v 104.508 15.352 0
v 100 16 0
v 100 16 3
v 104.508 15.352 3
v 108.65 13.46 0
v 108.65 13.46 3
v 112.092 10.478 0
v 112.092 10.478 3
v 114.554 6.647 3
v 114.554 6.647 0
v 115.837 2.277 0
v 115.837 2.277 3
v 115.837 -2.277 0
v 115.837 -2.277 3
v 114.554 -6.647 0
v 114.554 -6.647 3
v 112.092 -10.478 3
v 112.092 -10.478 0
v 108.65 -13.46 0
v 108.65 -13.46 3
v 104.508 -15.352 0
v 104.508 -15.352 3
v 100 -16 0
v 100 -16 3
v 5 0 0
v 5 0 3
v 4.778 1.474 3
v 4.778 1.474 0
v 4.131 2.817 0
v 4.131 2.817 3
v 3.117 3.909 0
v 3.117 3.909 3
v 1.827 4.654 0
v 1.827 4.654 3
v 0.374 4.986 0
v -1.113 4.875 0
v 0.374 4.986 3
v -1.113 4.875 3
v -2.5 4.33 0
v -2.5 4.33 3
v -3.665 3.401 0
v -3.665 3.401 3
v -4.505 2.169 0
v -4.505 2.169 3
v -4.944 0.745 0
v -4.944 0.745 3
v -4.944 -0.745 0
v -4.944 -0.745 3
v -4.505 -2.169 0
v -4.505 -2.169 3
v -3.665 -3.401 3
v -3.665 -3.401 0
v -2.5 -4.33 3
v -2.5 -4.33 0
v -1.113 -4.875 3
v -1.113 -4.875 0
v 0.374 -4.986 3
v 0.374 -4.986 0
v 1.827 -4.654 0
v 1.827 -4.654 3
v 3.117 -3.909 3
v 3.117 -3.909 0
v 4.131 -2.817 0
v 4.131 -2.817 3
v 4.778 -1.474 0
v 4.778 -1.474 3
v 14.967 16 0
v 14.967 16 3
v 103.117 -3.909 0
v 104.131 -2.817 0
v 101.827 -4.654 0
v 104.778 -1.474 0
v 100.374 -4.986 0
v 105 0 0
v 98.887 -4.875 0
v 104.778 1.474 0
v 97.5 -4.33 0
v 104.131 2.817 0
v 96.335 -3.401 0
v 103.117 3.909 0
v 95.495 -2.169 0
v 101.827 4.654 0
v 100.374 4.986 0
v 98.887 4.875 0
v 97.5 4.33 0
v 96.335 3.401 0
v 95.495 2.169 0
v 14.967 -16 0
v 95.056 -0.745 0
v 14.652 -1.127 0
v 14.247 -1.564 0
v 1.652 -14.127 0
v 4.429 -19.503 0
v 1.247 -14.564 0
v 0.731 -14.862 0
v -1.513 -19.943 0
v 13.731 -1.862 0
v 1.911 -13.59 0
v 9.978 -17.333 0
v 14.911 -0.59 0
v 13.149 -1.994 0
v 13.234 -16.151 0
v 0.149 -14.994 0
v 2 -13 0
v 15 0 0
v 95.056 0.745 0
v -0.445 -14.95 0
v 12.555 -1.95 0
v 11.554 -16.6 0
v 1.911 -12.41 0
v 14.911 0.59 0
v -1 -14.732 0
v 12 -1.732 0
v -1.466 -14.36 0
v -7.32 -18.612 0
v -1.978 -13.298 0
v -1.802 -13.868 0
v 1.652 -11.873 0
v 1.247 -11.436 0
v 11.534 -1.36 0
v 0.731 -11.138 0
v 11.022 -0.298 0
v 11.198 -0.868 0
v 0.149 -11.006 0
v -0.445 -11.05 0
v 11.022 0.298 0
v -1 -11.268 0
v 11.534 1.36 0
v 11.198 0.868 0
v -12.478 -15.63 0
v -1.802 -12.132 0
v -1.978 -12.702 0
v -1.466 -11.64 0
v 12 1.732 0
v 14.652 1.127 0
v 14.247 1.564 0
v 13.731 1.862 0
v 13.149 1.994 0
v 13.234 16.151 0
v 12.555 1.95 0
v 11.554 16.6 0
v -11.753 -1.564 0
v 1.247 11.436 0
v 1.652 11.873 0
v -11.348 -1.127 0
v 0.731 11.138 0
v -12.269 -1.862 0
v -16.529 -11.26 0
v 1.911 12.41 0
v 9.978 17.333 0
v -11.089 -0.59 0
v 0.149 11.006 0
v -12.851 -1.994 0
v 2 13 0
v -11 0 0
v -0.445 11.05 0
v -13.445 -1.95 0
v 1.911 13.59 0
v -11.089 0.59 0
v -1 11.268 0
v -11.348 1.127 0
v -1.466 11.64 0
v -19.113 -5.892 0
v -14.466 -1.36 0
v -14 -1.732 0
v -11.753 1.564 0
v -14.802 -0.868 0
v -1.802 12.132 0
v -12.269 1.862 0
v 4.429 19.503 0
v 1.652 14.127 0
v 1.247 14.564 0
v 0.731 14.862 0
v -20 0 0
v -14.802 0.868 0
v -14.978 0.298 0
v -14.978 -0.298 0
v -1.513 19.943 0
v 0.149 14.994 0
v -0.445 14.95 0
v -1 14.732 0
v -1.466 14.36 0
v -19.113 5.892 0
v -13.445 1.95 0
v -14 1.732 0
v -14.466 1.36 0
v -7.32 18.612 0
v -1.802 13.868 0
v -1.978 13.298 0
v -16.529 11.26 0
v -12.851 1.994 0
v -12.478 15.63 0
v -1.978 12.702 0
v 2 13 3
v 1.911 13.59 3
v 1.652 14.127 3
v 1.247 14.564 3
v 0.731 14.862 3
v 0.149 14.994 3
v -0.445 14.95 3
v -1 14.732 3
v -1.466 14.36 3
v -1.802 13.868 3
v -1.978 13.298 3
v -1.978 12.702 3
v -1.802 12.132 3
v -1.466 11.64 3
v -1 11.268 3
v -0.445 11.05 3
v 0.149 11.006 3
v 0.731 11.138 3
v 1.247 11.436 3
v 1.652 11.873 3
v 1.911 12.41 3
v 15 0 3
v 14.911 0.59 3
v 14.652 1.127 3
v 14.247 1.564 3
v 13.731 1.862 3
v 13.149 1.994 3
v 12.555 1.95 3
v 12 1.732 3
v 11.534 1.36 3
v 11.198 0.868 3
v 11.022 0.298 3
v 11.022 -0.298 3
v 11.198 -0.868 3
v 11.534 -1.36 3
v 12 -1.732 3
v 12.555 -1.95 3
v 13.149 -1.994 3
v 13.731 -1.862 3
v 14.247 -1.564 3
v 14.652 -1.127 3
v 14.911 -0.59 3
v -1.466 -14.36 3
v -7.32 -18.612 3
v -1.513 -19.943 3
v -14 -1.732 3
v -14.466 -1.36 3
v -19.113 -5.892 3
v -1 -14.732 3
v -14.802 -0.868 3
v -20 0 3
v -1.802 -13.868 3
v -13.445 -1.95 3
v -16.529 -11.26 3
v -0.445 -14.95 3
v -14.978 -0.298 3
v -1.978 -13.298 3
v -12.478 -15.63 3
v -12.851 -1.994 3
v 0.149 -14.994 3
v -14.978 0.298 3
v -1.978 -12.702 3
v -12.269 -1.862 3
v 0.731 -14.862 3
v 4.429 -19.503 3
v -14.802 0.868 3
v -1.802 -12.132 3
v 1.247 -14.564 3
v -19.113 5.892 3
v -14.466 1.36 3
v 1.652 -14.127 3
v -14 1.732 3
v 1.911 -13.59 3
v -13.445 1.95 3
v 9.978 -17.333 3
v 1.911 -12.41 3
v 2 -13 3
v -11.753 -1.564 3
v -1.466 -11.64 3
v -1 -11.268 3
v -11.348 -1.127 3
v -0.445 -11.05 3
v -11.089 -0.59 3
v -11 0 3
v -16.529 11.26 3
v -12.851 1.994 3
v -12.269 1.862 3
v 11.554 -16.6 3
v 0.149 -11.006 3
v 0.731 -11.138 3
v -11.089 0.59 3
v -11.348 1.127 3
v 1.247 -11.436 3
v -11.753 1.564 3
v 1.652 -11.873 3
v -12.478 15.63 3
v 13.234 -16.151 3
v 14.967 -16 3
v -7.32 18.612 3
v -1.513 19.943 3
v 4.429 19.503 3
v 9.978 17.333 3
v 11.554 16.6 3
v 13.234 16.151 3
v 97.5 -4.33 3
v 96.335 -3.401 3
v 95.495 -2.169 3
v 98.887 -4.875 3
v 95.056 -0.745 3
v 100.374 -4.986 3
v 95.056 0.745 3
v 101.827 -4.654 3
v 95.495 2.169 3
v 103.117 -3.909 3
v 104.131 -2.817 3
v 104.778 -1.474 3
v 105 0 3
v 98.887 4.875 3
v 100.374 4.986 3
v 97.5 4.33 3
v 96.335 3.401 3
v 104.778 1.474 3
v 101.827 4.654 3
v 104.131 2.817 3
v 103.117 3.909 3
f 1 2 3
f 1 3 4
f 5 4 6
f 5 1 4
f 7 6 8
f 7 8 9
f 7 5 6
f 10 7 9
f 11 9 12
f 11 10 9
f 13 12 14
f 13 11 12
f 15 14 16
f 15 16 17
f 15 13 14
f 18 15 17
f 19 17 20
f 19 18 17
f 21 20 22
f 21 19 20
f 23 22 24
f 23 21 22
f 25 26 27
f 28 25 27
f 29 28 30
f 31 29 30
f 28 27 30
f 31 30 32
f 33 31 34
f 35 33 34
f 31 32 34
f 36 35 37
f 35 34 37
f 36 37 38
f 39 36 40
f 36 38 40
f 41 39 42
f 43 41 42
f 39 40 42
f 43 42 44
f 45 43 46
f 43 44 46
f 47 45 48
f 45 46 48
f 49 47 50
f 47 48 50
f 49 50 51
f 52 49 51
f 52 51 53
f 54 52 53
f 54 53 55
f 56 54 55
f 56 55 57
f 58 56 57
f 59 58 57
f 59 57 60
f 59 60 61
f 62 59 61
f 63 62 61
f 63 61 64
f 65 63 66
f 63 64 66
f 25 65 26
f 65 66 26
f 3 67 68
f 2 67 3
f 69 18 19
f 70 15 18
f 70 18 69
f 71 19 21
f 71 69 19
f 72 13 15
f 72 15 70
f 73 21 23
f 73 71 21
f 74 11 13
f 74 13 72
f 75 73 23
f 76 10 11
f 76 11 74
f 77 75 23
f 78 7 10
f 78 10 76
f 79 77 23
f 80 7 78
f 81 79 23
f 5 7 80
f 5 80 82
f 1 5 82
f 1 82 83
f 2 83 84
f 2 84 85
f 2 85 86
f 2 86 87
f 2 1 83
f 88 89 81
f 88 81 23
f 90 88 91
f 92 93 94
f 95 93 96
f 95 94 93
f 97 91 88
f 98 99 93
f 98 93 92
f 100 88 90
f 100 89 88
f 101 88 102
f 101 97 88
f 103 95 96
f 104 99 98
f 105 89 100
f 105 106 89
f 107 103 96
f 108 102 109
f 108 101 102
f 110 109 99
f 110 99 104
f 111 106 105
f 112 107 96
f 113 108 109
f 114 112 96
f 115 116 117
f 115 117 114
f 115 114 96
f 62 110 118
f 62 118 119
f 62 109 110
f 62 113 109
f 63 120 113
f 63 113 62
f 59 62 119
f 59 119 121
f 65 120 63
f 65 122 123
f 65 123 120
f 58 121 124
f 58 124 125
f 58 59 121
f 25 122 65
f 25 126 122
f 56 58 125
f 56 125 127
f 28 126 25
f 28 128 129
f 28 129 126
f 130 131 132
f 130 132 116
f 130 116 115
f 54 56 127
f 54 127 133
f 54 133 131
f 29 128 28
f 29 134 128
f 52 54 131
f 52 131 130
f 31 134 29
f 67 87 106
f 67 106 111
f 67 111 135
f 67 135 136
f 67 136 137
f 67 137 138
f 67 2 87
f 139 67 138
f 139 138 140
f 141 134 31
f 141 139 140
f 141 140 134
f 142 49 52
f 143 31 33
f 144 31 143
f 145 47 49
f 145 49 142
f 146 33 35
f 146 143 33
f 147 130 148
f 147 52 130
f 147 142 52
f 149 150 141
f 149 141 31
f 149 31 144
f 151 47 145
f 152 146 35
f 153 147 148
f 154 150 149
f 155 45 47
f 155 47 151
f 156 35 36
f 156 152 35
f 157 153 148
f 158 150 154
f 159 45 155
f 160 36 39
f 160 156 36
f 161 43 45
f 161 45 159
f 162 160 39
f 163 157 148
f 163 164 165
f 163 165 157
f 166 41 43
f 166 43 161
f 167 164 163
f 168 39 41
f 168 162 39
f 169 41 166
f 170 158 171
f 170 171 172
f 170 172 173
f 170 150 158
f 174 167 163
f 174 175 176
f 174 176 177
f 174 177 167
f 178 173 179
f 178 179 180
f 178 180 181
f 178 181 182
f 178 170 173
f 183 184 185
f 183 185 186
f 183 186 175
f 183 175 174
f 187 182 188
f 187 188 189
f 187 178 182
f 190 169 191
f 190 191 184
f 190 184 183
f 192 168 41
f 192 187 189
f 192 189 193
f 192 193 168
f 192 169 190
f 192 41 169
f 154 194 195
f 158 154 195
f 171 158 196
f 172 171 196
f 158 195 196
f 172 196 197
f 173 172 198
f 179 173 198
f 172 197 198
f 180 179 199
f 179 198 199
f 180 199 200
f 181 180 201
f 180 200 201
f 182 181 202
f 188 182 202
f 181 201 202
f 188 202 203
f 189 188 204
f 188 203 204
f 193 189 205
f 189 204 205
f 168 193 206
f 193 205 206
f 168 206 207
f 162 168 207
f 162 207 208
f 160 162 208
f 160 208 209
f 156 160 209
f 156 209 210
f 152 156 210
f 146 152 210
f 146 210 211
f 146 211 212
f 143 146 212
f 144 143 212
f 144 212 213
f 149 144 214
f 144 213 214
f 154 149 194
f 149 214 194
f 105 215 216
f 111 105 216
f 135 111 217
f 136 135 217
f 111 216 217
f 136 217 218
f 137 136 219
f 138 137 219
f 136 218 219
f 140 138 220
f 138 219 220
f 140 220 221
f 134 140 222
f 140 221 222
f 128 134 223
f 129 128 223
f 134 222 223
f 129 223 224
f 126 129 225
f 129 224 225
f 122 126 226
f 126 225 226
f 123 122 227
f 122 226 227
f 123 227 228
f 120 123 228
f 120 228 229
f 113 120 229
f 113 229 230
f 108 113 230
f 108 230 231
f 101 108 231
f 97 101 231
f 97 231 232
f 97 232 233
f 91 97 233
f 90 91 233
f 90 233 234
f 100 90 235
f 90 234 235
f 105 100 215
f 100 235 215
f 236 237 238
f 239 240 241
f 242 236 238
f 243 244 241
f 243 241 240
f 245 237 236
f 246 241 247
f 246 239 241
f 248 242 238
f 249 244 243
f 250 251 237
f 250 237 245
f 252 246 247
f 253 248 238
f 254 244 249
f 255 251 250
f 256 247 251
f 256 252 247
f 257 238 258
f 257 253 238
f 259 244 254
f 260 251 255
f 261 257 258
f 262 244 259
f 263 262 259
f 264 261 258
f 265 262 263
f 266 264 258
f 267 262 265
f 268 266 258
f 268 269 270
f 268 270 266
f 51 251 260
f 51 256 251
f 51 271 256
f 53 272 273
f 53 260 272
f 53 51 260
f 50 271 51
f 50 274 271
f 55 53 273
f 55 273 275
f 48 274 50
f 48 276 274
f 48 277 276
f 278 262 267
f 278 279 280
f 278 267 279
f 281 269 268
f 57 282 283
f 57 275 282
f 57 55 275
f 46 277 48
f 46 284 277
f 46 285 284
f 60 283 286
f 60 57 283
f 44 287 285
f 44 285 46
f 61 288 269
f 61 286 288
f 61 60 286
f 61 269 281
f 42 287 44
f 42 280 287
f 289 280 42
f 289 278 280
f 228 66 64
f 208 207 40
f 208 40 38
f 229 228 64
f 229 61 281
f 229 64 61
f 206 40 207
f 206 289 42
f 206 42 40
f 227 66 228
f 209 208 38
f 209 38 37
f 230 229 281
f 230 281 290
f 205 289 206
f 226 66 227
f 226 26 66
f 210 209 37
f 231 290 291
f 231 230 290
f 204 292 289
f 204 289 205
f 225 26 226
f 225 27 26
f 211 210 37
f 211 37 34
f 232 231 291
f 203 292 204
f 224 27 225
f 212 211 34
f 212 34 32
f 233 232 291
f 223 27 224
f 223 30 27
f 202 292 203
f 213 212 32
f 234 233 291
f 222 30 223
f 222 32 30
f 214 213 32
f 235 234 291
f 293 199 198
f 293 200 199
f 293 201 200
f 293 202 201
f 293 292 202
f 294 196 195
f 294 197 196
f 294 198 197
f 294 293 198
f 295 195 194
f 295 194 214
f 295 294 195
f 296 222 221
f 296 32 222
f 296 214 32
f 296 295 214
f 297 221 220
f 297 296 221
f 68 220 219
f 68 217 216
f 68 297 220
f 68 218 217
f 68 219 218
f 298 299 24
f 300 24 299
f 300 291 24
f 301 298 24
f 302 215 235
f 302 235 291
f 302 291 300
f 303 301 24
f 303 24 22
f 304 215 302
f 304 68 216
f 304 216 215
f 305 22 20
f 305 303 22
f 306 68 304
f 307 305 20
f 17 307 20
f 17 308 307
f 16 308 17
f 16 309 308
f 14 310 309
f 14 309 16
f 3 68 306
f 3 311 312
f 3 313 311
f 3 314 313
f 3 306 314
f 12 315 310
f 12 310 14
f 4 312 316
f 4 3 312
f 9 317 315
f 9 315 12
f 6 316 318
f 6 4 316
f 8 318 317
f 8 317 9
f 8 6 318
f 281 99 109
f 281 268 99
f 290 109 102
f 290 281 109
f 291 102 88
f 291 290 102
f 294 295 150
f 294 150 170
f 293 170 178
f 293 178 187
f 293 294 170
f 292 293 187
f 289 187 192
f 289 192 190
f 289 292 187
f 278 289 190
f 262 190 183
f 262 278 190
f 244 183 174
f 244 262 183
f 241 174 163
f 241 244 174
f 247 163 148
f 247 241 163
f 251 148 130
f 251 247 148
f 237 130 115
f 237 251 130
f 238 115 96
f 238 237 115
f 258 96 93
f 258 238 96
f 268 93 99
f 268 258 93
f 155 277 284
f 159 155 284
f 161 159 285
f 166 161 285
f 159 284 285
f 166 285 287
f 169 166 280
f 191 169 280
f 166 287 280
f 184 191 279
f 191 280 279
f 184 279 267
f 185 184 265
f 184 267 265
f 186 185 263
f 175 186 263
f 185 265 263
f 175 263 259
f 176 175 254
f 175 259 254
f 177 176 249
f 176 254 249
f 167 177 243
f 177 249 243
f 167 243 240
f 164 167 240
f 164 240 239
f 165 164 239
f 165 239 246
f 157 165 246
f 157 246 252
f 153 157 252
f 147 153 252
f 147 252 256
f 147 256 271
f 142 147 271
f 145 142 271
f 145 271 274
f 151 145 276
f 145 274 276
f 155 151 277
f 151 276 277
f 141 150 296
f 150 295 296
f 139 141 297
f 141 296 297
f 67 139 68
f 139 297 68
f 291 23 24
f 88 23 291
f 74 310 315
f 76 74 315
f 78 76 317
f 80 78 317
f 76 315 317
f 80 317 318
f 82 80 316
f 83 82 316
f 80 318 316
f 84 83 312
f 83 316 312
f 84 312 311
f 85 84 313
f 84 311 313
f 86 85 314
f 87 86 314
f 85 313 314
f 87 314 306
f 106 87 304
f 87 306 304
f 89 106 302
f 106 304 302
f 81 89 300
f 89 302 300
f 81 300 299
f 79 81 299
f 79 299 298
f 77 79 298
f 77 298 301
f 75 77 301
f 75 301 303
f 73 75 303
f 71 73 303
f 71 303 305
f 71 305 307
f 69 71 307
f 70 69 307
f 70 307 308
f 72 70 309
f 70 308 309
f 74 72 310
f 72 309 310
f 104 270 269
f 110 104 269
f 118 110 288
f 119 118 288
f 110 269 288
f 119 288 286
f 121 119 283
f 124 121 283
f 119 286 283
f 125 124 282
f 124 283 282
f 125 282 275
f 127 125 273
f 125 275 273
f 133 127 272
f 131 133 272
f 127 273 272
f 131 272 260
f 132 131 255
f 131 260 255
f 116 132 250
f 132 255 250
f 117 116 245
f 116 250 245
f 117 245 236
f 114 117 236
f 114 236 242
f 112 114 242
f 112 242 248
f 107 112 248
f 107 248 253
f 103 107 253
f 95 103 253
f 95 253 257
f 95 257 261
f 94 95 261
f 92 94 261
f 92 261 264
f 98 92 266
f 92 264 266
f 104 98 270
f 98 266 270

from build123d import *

# Parameters (mm, degrees)
EXTRUDE_1_DEPTH     = 3
SKETCH_2_R          = 20
EXTRUDE_2_DEPTH     = 3
FILLET_1_R          = 10
SKETCH_3_R          = 2
SKETCH_3_R_2        = 5
CUT_EXTRUDE_1_DEPTH = 3


with BuildPart() as part:
    # 草图1 → 凸台-拉伸1 (new body)
    with BuildSketch(Plane.XY):
        with BuildLine():
            Line((0, 16), (100, 16))
            ThreePointArc((100, 16), (116, 0), (100, -16))
            Line((100, -16), (0, -16))
            ThreePointArc((0, -16), (-16, 0), (0, 16))
        make_face()
    extrude(amount=EXTRUDE_1_DEPTH)

    # 草图2 → 凸台-拉伸2 (add)
    with BuildSketch(Plane.XY.offset(3)):
        Circle(SKETCH_2_R)
    extrude(amount=-EXTRUDE_2_DEPTH)

    # 圆角1
    fillet_1_edges = [part.edges().sort_by_distance(p)[0] for p in [
        (12, -16, 1.5),
        (12, 16, 1.5),
    ]]
    fillet(fillet_1_edges, radius=FILLET_1_R)

    # 草图3 → 切除-拉伸1 (cut)
    with BuildSketch(Plane.XY.offset(3)):
        with Locations((0, 13)):
            Circle(SKETCH_3_R)
        with Locations((13, 0)):
            Circle(SKETCH_3_R)
        with Locations((0, -13)):
            Circle(SKETCH_3_R)
        with Locations((-13, 0)):
            Circle(SKETCH_3_R)
        Circle(SKETCH_3_R_2)
        with Locations((100, 0)):
            Circle(SKETCH_3_R_2)
    extrude(amount=-CUT_EXTRUDE_1_DEPTH, mode=Mode.SUBTRACT)


solid = part.part
